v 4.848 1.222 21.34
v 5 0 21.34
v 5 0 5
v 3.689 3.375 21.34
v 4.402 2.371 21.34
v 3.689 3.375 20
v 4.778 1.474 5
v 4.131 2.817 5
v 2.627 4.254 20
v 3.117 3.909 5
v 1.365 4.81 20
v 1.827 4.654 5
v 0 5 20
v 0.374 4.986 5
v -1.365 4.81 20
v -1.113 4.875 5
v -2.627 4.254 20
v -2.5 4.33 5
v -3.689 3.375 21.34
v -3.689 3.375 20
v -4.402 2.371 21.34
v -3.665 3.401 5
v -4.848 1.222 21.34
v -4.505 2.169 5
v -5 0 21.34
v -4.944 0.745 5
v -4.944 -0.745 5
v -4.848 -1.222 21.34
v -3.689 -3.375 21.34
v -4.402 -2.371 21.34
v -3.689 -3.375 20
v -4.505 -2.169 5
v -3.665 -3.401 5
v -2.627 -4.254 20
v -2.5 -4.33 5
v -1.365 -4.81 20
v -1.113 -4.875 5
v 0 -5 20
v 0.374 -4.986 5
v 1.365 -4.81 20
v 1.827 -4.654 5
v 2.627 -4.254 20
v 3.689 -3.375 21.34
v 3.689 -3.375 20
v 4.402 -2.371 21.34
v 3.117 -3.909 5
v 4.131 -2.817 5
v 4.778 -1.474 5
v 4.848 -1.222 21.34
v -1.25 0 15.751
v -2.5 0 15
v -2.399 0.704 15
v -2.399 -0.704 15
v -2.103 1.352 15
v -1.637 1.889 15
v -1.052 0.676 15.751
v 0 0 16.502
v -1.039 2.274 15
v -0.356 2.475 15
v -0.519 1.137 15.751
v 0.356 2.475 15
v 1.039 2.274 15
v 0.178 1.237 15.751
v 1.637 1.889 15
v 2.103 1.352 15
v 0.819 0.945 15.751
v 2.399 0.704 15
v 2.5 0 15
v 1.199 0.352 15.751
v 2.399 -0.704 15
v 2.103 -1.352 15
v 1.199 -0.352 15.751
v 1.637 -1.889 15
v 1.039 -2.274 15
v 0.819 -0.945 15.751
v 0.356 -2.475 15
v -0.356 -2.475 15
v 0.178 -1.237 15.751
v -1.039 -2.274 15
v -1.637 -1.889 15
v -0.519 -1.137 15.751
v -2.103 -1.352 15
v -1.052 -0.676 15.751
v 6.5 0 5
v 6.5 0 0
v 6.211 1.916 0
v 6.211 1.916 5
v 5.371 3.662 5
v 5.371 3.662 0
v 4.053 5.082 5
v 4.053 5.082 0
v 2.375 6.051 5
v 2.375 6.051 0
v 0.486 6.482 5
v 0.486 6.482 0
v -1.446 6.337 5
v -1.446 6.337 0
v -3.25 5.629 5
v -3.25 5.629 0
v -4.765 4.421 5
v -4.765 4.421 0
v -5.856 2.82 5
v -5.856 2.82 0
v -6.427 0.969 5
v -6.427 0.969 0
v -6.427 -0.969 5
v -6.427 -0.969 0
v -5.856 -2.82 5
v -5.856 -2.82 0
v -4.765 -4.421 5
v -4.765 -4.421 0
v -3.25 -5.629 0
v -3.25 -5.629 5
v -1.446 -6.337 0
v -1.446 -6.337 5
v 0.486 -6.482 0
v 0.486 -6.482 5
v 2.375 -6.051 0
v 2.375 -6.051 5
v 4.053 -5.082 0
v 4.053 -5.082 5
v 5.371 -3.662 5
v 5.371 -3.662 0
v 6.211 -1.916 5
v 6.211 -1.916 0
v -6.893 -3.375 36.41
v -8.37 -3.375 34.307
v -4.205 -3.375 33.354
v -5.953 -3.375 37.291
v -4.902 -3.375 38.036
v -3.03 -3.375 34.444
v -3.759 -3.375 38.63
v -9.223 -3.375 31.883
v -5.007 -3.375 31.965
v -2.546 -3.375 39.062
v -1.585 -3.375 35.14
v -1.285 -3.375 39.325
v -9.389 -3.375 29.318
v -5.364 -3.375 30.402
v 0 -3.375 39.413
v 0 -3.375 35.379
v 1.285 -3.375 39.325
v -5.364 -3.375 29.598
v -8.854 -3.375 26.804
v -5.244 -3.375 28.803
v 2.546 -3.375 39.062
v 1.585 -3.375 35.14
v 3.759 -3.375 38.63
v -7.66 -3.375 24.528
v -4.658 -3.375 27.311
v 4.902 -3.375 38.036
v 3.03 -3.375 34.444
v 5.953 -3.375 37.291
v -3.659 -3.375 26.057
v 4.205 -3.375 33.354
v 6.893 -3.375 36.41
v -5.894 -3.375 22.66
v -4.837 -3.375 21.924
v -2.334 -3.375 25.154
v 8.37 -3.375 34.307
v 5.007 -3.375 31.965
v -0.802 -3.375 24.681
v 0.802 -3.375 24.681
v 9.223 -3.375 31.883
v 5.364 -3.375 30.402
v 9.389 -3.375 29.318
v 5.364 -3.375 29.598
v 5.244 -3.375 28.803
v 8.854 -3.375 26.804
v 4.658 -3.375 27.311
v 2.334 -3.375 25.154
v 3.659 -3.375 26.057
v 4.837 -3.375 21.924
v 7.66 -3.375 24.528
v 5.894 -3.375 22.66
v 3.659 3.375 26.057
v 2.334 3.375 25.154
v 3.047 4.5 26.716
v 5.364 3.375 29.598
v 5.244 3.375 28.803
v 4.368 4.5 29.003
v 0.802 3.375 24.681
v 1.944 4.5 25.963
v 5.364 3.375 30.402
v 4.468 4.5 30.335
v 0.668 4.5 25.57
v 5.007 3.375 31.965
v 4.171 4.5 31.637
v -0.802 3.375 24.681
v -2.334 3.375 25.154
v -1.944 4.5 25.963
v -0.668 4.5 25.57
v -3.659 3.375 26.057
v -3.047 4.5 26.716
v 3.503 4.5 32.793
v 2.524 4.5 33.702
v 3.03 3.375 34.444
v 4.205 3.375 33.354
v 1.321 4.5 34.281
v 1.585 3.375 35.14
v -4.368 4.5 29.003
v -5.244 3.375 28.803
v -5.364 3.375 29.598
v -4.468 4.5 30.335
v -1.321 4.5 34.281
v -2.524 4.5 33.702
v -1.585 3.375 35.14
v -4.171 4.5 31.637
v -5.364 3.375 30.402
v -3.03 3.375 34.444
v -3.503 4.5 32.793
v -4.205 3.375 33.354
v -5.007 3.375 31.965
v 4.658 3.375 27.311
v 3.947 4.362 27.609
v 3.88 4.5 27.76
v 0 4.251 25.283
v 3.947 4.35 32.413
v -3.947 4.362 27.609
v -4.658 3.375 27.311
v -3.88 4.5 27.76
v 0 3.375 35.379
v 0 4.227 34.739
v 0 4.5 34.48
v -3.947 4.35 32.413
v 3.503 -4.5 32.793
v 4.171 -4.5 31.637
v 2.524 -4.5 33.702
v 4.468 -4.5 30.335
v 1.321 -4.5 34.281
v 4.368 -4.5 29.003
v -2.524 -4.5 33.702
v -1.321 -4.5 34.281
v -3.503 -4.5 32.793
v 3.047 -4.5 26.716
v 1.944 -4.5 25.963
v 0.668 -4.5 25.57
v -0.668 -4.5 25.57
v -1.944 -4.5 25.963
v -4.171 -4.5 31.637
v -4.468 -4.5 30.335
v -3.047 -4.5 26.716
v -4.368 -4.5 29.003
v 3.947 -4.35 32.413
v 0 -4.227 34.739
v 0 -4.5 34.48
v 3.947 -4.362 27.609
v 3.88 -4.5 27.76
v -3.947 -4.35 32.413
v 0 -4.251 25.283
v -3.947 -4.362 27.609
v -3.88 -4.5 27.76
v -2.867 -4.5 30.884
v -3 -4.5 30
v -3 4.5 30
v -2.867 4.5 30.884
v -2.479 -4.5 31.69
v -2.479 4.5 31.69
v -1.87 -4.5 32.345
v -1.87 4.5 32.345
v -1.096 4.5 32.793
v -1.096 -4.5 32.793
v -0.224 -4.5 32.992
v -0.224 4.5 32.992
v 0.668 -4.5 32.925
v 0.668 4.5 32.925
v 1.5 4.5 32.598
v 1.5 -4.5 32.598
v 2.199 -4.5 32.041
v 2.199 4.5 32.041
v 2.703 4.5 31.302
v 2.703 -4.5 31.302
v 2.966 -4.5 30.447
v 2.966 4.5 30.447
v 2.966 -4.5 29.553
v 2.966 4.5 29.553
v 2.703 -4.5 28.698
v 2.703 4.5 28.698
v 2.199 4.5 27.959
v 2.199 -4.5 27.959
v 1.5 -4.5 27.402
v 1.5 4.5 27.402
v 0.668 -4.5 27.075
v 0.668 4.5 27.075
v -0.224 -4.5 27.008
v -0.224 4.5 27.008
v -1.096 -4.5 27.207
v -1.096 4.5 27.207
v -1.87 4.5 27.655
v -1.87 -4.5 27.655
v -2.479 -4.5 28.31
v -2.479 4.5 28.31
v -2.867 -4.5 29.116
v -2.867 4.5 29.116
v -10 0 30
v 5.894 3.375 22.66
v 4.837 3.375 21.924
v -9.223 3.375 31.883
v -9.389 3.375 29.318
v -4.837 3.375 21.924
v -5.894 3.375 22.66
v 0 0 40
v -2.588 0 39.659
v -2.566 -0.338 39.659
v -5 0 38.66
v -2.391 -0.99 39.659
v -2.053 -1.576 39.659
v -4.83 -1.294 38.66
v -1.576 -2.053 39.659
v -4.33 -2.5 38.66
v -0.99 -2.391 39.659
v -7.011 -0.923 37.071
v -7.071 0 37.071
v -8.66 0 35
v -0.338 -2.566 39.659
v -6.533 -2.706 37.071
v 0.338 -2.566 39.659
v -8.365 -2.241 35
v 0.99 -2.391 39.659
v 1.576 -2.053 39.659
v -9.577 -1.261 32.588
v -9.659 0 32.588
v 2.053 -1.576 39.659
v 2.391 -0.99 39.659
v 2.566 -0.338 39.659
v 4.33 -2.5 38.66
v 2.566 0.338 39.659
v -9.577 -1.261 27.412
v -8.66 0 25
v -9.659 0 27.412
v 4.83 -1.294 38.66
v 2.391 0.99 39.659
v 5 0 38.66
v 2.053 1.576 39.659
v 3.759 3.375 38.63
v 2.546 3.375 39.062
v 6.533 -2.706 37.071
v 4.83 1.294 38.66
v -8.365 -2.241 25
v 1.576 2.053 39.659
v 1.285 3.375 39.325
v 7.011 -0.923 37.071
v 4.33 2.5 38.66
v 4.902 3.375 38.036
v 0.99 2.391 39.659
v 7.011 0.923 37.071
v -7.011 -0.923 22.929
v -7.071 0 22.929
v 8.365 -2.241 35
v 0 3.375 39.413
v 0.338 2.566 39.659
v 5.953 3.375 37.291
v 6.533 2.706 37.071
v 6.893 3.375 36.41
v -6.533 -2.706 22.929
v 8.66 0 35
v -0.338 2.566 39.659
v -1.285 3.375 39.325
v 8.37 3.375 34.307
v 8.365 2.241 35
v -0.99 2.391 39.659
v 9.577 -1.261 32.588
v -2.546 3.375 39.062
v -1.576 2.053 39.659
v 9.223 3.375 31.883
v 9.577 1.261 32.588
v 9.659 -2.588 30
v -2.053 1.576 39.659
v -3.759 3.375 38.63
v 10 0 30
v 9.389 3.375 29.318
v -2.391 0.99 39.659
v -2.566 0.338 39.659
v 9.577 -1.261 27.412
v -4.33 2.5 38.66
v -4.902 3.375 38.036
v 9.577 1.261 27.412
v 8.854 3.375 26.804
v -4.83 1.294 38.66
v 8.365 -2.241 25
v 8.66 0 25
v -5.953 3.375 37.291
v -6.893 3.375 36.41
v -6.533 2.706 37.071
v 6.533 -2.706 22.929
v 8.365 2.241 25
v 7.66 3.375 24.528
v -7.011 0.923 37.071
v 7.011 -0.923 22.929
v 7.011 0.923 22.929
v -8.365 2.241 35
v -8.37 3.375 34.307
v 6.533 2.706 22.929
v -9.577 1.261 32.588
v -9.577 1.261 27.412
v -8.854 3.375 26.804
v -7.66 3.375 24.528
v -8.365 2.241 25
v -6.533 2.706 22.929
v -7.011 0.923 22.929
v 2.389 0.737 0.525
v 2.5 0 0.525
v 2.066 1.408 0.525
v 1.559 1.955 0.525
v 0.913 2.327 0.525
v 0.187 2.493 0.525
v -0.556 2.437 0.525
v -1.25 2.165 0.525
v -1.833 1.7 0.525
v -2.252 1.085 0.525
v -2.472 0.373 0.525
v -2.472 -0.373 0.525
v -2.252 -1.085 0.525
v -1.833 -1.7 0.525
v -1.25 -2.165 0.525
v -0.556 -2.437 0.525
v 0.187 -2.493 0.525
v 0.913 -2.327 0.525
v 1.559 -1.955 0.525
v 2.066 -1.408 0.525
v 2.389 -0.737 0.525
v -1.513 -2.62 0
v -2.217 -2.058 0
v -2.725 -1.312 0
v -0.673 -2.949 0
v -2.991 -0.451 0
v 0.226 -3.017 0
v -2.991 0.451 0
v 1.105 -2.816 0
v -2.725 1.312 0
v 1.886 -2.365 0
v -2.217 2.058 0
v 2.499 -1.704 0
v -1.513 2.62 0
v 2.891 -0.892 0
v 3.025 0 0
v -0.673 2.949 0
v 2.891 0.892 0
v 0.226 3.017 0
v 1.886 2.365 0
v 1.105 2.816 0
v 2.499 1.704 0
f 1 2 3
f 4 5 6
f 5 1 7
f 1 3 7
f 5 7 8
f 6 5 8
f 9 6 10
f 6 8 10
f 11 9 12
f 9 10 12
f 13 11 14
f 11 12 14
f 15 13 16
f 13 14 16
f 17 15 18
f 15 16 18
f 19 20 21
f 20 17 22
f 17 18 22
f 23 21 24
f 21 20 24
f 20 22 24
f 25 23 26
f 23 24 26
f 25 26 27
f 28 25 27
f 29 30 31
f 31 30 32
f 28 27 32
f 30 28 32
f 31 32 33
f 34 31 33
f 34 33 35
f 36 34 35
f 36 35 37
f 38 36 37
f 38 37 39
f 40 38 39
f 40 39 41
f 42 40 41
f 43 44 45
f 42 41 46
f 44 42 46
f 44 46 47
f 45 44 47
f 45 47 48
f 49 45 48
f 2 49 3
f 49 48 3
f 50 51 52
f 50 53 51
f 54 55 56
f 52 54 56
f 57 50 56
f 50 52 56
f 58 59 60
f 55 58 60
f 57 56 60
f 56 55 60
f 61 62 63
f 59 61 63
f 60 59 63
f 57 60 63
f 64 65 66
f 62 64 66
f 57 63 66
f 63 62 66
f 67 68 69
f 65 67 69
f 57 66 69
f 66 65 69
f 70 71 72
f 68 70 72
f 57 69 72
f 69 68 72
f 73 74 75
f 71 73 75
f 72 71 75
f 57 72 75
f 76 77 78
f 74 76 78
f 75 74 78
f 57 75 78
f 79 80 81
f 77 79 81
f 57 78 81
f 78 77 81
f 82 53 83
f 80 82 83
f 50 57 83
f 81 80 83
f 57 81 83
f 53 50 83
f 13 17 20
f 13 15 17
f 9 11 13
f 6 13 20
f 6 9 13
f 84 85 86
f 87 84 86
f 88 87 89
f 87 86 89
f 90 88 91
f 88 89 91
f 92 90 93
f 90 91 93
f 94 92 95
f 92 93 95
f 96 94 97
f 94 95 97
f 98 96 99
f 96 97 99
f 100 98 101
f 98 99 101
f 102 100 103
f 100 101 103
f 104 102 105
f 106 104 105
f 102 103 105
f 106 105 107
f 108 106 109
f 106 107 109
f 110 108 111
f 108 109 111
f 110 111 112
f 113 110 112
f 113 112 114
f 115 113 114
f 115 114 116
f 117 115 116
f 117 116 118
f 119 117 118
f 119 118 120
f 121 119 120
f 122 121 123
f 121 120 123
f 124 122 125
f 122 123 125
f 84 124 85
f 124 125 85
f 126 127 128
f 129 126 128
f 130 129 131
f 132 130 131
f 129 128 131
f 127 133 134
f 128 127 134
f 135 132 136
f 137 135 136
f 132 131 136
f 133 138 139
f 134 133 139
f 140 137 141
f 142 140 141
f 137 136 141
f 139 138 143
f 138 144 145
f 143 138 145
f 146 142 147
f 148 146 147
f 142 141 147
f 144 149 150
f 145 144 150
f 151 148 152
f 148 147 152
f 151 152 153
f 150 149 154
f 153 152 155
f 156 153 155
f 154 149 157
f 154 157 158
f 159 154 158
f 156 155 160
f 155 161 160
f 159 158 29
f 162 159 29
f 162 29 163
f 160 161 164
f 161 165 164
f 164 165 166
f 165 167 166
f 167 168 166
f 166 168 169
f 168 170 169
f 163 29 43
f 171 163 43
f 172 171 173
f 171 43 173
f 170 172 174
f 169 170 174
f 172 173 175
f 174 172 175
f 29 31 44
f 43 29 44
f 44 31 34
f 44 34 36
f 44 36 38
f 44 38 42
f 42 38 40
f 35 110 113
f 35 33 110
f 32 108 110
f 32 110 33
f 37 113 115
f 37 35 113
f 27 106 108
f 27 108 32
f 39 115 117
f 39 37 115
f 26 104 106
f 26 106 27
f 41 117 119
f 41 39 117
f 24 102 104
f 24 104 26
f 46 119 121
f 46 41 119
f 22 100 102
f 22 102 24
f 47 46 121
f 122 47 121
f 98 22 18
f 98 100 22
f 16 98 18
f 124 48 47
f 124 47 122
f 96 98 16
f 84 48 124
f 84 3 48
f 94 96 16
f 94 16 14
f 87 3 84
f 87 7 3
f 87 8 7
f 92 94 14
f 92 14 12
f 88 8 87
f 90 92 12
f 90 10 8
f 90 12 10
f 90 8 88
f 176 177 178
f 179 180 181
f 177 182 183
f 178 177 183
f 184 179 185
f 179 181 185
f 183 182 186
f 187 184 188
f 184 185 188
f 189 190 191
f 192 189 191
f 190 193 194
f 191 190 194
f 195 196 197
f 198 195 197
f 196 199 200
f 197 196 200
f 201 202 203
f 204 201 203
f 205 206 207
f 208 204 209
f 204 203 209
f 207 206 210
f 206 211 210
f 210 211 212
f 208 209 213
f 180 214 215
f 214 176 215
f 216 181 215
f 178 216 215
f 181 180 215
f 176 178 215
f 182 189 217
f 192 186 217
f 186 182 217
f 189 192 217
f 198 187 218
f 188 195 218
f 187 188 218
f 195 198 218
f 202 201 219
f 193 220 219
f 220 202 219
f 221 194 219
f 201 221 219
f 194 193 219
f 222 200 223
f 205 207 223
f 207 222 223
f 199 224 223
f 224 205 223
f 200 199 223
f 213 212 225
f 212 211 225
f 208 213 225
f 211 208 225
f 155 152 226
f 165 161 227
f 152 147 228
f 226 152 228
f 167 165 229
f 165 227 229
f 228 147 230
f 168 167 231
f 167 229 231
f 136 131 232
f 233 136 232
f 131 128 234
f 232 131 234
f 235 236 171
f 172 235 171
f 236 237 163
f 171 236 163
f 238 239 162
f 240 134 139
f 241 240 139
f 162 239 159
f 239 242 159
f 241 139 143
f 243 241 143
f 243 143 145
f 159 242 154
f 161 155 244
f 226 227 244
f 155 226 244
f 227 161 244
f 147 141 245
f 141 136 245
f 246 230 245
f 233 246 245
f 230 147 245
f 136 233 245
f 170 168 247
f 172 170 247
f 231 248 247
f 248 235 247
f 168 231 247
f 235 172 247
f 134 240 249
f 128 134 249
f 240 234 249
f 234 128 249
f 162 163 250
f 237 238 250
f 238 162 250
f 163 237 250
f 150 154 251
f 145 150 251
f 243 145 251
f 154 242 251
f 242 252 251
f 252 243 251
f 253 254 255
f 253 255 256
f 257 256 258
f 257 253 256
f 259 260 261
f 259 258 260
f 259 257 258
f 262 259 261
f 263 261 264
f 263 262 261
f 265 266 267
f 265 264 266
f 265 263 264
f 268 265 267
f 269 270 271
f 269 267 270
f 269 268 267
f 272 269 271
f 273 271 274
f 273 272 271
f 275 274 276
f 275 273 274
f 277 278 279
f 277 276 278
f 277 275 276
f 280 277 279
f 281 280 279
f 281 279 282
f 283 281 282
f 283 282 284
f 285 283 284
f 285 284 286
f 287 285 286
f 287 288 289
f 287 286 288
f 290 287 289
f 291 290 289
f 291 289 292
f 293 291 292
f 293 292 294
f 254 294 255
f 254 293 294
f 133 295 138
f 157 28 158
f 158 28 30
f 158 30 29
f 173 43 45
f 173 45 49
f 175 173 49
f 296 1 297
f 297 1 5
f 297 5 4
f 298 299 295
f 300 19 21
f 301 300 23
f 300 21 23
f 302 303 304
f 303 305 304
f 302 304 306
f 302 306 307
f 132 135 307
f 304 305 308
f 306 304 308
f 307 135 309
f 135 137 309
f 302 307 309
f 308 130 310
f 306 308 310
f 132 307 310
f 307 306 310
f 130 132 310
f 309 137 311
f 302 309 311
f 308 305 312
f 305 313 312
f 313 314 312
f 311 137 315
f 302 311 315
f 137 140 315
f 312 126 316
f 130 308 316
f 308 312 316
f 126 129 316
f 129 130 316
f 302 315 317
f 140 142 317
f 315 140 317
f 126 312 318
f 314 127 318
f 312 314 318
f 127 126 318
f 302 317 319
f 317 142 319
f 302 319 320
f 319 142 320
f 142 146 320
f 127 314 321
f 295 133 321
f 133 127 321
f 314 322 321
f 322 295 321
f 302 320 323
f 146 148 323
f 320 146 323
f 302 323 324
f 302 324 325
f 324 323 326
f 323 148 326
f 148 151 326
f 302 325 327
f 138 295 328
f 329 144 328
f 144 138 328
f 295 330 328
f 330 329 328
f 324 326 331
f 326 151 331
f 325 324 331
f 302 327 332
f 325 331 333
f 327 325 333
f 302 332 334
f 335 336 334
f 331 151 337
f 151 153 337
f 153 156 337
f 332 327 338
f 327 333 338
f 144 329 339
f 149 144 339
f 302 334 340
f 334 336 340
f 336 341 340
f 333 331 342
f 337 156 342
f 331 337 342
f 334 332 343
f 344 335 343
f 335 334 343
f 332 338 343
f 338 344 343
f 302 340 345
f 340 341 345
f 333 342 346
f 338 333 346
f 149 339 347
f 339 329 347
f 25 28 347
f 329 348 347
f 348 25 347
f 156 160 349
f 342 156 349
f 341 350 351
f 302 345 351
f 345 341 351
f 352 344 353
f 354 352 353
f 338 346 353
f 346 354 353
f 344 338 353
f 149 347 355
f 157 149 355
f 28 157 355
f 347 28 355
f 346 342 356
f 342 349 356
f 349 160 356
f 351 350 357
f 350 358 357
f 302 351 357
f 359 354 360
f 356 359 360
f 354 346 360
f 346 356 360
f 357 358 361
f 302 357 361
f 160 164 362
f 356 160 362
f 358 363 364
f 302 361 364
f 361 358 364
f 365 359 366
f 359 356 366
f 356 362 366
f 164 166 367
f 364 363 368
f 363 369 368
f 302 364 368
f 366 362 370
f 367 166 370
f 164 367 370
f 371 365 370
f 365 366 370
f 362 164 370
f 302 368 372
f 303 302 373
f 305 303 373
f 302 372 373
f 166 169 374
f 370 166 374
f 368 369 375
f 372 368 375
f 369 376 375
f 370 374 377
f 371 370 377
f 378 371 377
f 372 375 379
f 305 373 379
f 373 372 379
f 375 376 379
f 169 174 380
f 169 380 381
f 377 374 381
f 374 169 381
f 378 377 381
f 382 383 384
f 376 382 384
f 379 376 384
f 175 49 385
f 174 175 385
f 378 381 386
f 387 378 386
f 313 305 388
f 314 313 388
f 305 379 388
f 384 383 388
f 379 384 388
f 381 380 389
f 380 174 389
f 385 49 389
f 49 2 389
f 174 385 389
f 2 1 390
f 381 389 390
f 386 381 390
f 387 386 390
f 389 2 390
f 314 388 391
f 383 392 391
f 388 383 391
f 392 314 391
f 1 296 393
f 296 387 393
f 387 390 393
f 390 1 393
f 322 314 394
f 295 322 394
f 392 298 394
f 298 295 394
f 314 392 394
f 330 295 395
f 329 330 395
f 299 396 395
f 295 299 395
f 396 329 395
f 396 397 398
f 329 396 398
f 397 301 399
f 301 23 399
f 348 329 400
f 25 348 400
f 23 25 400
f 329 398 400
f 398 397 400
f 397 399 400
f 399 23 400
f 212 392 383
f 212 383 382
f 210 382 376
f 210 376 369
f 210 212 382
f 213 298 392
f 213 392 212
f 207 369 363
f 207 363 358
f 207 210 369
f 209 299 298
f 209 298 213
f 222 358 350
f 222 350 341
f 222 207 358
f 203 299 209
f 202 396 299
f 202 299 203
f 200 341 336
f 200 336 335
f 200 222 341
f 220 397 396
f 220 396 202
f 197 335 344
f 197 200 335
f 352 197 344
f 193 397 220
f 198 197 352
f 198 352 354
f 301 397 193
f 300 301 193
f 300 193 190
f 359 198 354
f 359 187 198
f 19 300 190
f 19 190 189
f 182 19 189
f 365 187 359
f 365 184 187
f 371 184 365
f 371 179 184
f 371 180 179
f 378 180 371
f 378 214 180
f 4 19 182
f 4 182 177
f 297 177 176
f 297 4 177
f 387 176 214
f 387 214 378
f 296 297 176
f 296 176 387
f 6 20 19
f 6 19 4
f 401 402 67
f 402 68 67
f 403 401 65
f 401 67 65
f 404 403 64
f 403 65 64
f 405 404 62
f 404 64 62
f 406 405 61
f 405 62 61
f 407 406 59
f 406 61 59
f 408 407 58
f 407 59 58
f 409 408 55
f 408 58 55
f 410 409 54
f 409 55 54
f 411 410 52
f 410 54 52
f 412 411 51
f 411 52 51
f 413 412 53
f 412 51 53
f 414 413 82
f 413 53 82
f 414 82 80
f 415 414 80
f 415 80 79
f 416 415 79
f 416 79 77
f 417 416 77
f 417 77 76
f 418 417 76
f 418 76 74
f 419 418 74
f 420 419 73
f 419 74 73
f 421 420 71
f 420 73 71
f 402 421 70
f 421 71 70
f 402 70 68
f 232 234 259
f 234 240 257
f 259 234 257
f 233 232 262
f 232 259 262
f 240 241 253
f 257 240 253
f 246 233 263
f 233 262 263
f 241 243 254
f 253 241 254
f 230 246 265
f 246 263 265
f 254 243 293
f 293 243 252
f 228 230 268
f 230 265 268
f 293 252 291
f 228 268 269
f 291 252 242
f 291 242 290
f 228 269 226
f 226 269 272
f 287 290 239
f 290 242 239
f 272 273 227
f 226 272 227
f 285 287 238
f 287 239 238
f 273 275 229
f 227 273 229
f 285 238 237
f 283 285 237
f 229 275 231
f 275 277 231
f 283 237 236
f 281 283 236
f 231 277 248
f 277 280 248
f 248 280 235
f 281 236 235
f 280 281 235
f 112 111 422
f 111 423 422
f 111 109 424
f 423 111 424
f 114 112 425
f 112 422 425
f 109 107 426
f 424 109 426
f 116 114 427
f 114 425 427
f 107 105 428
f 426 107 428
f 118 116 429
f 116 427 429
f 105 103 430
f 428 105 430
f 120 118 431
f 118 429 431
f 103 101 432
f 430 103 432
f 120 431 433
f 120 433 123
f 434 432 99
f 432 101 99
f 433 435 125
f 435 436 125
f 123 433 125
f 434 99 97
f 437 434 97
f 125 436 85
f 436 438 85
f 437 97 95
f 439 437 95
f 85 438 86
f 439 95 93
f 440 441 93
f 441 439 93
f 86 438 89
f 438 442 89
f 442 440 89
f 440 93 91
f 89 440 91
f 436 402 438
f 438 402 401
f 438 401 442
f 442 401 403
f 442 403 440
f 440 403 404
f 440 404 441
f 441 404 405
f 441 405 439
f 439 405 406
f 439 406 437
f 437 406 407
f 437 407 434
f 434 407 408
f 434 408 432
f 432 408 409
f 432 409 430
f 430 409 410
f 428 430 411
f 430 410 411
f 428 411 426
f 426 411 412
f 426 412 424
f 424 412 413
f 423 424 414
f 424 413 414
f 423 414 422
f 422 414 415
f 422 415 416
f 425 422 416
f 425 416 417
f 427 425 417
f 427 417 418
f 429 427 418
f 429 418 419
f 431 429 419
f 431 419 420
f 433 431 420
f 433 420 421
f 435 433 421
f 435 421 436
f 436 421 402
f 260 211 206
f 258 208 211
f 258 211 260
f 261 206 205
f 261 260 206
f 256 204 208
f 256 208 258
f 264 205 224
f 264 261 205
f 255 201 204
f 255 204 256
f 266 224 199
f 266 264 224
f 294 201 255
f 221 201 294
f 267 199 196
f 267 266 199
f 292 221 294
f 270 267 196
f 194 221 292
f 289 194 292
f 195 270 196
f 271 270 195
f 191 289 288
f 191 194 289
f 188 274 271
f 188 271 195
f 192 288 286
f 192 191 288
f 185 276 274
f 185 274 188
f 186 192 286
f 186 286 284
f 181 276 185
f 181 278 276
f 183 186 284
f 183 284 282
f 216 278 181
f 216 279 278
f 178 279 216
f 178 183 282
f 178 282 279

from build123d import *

# Parameters (mm, degrees)
SKETCH_3_R                   = 6.5
EXTRUDE_1_DEPTH              = 5
SKETCH_4_R                   = 5
EXTRUDE_2_DEPTH              = 20
SKETCH_6_W                   = 25
SKETCH_6_H                   = 25
SKETCH_6_W_2                 = 24
SKETCH_6_H_2                 = 6.75
CUT_EXTRUDE_1_DEPTH          = 25
CUT_EXTRUDE_3_DEPTH          = 42.740268327
CUT_EXTRUDE_3_DEPTH_BACK     = 42.740268327
SKETCH_10_R                  = 3
HOLE_WIZARD_M6_1_D           = 5
HOLE_WIZARD_M6_1_DEPTH       = 15
HOLE_WIZARD_M6_1_CSINK_D     = 6.05
HOLE_WIZARD_M6_1_CSINK_ANGLE = 90
HOLE_WIZARD_M6_1_TIP         = 1.502151548
SKETCH_16_R                  = 20
SKETCH_16_W                  = 25
SKETCH_16_H                  = 9
CUT_EXTRUDE_4_DEPTH          = 24.286262044


with BuildPart() as part:
    # 草图3 → 凸台-拉伸1 (new body)
    with BuildSketch(Plane.XY):
        Circle(SKETCH_3_R)
    extrude(amount=EXTRUDE_1_DEPTH)

    # 草图4 → 凸台-拉伸2 (add)
    with BuildSketch(Plane.XY.offset(5)):
        Circle(SKETCH_4_R)
    extrude(amount=EXTRUDE_2_DEPTH)

    # 草图5 → 旋转4 (revolve)
    with BuildSketch(Plane(origin=(0, 0, 0), x_dir=(1, 0, 0), z_dir=(0, 1, 0))):
        with BuildLine():
            Line((0, -20), (0, -40))
            ThreePointArc((0, -40), (-10, -30), (0, -20))
        make_face()
    revolve(axis=Axis((0, 0, 0), (0, 0, 1)))

    # 草图6 → 切除-拉伸1 (cut)
    with BuildSketch(Plane.XY.offset(20)):
        Rectangle(SKETCH_6_W, SKETCH_6_H)
        Rectangle(SKETCH_6_W_2, SKETCH_6_H_2, mode=Mode.SUBTRACT)
    extrude(amount=CUT_EXTRUDE_1_DEPTH, mode=Mode.SUBTRACT)

    # 草图8 → 旋转5 (revolve)
    with BuildSketch(Plane(origin=(0, 0, 0), x_dir=(1, 0, 0), z_dir=(0, 1, 0))):
        with BuildLine():
            Line((-6.35, -30), (6.35, -30))
            ThreePointArc((6.35, -30), (0, -36.35), (-6.35, -30))
        make_face()
    revolve(axis=Axis((-10, 0, 30), (1, 0, 0)))

    # 草图10 → 切除-拉伸3 (cut, two sides: drawn at the far end of the back side and taken through both)
    with BuildSketch(Plane(origin=(0, 0, 0), x_dir=(1, 0, 0), z_dir=(0, 1, 0)).offset(-CUT_EXTRUDE_3_DEPTH_BACK)):
        with Locations(Location((0, -30, 0), (0, 0, 180))):
            Circle(SKETCH_10_R)
    extrude(amount=CUT_EXTRUDE_3_DEPTH + CUT_EXTRUDE_3_DEPTH_BACK, mode=Mode.SUBTRACT)

    # M6 螺纹孔1
    with Locations(Plane(origin=(0, 0, 0), x_dir=(-1, 0, 0), z_dir=(0, 0, -1))):
        with Locations((0, 0)):
            CounterSinkHole(HOLE_WIZARD_M6_1_D / 2, HOLE_WIZARD_M6_1_CSINK_D / 2, depth=HOLE_WIZARD_M6_1_DEPTH, counter_sink_angle=HOLE_WIZARD_M6_1_CSINK_ANGLE)
            with Locations((0, 0, -(HOLE_WIZARD_M6_1_DEPTH + HOLE_WIZARD_M6_1_TIP / 2))):  # 118° drill point
                Cone(0, HOLE_WIZARD_M6_1_D / 2, HOLE_WIZARD_M6_1_TIP, mode=Mode.SUBTRACT)

    # 草图16 → 切除-拉伸4 (cut, through all)
    with BuildSketch(Plane.XY.offset(20)):
        Circle(SKETCH_16_R)
        Rectangle(SKETCH_16_W, SKETCH_16_H, mode=Mode.SUBTRACT)
    extrude(amount=CUT_EXTRUDE_4_DEPTH, mode=Mode.SUBTRACT)


solid = part.part
